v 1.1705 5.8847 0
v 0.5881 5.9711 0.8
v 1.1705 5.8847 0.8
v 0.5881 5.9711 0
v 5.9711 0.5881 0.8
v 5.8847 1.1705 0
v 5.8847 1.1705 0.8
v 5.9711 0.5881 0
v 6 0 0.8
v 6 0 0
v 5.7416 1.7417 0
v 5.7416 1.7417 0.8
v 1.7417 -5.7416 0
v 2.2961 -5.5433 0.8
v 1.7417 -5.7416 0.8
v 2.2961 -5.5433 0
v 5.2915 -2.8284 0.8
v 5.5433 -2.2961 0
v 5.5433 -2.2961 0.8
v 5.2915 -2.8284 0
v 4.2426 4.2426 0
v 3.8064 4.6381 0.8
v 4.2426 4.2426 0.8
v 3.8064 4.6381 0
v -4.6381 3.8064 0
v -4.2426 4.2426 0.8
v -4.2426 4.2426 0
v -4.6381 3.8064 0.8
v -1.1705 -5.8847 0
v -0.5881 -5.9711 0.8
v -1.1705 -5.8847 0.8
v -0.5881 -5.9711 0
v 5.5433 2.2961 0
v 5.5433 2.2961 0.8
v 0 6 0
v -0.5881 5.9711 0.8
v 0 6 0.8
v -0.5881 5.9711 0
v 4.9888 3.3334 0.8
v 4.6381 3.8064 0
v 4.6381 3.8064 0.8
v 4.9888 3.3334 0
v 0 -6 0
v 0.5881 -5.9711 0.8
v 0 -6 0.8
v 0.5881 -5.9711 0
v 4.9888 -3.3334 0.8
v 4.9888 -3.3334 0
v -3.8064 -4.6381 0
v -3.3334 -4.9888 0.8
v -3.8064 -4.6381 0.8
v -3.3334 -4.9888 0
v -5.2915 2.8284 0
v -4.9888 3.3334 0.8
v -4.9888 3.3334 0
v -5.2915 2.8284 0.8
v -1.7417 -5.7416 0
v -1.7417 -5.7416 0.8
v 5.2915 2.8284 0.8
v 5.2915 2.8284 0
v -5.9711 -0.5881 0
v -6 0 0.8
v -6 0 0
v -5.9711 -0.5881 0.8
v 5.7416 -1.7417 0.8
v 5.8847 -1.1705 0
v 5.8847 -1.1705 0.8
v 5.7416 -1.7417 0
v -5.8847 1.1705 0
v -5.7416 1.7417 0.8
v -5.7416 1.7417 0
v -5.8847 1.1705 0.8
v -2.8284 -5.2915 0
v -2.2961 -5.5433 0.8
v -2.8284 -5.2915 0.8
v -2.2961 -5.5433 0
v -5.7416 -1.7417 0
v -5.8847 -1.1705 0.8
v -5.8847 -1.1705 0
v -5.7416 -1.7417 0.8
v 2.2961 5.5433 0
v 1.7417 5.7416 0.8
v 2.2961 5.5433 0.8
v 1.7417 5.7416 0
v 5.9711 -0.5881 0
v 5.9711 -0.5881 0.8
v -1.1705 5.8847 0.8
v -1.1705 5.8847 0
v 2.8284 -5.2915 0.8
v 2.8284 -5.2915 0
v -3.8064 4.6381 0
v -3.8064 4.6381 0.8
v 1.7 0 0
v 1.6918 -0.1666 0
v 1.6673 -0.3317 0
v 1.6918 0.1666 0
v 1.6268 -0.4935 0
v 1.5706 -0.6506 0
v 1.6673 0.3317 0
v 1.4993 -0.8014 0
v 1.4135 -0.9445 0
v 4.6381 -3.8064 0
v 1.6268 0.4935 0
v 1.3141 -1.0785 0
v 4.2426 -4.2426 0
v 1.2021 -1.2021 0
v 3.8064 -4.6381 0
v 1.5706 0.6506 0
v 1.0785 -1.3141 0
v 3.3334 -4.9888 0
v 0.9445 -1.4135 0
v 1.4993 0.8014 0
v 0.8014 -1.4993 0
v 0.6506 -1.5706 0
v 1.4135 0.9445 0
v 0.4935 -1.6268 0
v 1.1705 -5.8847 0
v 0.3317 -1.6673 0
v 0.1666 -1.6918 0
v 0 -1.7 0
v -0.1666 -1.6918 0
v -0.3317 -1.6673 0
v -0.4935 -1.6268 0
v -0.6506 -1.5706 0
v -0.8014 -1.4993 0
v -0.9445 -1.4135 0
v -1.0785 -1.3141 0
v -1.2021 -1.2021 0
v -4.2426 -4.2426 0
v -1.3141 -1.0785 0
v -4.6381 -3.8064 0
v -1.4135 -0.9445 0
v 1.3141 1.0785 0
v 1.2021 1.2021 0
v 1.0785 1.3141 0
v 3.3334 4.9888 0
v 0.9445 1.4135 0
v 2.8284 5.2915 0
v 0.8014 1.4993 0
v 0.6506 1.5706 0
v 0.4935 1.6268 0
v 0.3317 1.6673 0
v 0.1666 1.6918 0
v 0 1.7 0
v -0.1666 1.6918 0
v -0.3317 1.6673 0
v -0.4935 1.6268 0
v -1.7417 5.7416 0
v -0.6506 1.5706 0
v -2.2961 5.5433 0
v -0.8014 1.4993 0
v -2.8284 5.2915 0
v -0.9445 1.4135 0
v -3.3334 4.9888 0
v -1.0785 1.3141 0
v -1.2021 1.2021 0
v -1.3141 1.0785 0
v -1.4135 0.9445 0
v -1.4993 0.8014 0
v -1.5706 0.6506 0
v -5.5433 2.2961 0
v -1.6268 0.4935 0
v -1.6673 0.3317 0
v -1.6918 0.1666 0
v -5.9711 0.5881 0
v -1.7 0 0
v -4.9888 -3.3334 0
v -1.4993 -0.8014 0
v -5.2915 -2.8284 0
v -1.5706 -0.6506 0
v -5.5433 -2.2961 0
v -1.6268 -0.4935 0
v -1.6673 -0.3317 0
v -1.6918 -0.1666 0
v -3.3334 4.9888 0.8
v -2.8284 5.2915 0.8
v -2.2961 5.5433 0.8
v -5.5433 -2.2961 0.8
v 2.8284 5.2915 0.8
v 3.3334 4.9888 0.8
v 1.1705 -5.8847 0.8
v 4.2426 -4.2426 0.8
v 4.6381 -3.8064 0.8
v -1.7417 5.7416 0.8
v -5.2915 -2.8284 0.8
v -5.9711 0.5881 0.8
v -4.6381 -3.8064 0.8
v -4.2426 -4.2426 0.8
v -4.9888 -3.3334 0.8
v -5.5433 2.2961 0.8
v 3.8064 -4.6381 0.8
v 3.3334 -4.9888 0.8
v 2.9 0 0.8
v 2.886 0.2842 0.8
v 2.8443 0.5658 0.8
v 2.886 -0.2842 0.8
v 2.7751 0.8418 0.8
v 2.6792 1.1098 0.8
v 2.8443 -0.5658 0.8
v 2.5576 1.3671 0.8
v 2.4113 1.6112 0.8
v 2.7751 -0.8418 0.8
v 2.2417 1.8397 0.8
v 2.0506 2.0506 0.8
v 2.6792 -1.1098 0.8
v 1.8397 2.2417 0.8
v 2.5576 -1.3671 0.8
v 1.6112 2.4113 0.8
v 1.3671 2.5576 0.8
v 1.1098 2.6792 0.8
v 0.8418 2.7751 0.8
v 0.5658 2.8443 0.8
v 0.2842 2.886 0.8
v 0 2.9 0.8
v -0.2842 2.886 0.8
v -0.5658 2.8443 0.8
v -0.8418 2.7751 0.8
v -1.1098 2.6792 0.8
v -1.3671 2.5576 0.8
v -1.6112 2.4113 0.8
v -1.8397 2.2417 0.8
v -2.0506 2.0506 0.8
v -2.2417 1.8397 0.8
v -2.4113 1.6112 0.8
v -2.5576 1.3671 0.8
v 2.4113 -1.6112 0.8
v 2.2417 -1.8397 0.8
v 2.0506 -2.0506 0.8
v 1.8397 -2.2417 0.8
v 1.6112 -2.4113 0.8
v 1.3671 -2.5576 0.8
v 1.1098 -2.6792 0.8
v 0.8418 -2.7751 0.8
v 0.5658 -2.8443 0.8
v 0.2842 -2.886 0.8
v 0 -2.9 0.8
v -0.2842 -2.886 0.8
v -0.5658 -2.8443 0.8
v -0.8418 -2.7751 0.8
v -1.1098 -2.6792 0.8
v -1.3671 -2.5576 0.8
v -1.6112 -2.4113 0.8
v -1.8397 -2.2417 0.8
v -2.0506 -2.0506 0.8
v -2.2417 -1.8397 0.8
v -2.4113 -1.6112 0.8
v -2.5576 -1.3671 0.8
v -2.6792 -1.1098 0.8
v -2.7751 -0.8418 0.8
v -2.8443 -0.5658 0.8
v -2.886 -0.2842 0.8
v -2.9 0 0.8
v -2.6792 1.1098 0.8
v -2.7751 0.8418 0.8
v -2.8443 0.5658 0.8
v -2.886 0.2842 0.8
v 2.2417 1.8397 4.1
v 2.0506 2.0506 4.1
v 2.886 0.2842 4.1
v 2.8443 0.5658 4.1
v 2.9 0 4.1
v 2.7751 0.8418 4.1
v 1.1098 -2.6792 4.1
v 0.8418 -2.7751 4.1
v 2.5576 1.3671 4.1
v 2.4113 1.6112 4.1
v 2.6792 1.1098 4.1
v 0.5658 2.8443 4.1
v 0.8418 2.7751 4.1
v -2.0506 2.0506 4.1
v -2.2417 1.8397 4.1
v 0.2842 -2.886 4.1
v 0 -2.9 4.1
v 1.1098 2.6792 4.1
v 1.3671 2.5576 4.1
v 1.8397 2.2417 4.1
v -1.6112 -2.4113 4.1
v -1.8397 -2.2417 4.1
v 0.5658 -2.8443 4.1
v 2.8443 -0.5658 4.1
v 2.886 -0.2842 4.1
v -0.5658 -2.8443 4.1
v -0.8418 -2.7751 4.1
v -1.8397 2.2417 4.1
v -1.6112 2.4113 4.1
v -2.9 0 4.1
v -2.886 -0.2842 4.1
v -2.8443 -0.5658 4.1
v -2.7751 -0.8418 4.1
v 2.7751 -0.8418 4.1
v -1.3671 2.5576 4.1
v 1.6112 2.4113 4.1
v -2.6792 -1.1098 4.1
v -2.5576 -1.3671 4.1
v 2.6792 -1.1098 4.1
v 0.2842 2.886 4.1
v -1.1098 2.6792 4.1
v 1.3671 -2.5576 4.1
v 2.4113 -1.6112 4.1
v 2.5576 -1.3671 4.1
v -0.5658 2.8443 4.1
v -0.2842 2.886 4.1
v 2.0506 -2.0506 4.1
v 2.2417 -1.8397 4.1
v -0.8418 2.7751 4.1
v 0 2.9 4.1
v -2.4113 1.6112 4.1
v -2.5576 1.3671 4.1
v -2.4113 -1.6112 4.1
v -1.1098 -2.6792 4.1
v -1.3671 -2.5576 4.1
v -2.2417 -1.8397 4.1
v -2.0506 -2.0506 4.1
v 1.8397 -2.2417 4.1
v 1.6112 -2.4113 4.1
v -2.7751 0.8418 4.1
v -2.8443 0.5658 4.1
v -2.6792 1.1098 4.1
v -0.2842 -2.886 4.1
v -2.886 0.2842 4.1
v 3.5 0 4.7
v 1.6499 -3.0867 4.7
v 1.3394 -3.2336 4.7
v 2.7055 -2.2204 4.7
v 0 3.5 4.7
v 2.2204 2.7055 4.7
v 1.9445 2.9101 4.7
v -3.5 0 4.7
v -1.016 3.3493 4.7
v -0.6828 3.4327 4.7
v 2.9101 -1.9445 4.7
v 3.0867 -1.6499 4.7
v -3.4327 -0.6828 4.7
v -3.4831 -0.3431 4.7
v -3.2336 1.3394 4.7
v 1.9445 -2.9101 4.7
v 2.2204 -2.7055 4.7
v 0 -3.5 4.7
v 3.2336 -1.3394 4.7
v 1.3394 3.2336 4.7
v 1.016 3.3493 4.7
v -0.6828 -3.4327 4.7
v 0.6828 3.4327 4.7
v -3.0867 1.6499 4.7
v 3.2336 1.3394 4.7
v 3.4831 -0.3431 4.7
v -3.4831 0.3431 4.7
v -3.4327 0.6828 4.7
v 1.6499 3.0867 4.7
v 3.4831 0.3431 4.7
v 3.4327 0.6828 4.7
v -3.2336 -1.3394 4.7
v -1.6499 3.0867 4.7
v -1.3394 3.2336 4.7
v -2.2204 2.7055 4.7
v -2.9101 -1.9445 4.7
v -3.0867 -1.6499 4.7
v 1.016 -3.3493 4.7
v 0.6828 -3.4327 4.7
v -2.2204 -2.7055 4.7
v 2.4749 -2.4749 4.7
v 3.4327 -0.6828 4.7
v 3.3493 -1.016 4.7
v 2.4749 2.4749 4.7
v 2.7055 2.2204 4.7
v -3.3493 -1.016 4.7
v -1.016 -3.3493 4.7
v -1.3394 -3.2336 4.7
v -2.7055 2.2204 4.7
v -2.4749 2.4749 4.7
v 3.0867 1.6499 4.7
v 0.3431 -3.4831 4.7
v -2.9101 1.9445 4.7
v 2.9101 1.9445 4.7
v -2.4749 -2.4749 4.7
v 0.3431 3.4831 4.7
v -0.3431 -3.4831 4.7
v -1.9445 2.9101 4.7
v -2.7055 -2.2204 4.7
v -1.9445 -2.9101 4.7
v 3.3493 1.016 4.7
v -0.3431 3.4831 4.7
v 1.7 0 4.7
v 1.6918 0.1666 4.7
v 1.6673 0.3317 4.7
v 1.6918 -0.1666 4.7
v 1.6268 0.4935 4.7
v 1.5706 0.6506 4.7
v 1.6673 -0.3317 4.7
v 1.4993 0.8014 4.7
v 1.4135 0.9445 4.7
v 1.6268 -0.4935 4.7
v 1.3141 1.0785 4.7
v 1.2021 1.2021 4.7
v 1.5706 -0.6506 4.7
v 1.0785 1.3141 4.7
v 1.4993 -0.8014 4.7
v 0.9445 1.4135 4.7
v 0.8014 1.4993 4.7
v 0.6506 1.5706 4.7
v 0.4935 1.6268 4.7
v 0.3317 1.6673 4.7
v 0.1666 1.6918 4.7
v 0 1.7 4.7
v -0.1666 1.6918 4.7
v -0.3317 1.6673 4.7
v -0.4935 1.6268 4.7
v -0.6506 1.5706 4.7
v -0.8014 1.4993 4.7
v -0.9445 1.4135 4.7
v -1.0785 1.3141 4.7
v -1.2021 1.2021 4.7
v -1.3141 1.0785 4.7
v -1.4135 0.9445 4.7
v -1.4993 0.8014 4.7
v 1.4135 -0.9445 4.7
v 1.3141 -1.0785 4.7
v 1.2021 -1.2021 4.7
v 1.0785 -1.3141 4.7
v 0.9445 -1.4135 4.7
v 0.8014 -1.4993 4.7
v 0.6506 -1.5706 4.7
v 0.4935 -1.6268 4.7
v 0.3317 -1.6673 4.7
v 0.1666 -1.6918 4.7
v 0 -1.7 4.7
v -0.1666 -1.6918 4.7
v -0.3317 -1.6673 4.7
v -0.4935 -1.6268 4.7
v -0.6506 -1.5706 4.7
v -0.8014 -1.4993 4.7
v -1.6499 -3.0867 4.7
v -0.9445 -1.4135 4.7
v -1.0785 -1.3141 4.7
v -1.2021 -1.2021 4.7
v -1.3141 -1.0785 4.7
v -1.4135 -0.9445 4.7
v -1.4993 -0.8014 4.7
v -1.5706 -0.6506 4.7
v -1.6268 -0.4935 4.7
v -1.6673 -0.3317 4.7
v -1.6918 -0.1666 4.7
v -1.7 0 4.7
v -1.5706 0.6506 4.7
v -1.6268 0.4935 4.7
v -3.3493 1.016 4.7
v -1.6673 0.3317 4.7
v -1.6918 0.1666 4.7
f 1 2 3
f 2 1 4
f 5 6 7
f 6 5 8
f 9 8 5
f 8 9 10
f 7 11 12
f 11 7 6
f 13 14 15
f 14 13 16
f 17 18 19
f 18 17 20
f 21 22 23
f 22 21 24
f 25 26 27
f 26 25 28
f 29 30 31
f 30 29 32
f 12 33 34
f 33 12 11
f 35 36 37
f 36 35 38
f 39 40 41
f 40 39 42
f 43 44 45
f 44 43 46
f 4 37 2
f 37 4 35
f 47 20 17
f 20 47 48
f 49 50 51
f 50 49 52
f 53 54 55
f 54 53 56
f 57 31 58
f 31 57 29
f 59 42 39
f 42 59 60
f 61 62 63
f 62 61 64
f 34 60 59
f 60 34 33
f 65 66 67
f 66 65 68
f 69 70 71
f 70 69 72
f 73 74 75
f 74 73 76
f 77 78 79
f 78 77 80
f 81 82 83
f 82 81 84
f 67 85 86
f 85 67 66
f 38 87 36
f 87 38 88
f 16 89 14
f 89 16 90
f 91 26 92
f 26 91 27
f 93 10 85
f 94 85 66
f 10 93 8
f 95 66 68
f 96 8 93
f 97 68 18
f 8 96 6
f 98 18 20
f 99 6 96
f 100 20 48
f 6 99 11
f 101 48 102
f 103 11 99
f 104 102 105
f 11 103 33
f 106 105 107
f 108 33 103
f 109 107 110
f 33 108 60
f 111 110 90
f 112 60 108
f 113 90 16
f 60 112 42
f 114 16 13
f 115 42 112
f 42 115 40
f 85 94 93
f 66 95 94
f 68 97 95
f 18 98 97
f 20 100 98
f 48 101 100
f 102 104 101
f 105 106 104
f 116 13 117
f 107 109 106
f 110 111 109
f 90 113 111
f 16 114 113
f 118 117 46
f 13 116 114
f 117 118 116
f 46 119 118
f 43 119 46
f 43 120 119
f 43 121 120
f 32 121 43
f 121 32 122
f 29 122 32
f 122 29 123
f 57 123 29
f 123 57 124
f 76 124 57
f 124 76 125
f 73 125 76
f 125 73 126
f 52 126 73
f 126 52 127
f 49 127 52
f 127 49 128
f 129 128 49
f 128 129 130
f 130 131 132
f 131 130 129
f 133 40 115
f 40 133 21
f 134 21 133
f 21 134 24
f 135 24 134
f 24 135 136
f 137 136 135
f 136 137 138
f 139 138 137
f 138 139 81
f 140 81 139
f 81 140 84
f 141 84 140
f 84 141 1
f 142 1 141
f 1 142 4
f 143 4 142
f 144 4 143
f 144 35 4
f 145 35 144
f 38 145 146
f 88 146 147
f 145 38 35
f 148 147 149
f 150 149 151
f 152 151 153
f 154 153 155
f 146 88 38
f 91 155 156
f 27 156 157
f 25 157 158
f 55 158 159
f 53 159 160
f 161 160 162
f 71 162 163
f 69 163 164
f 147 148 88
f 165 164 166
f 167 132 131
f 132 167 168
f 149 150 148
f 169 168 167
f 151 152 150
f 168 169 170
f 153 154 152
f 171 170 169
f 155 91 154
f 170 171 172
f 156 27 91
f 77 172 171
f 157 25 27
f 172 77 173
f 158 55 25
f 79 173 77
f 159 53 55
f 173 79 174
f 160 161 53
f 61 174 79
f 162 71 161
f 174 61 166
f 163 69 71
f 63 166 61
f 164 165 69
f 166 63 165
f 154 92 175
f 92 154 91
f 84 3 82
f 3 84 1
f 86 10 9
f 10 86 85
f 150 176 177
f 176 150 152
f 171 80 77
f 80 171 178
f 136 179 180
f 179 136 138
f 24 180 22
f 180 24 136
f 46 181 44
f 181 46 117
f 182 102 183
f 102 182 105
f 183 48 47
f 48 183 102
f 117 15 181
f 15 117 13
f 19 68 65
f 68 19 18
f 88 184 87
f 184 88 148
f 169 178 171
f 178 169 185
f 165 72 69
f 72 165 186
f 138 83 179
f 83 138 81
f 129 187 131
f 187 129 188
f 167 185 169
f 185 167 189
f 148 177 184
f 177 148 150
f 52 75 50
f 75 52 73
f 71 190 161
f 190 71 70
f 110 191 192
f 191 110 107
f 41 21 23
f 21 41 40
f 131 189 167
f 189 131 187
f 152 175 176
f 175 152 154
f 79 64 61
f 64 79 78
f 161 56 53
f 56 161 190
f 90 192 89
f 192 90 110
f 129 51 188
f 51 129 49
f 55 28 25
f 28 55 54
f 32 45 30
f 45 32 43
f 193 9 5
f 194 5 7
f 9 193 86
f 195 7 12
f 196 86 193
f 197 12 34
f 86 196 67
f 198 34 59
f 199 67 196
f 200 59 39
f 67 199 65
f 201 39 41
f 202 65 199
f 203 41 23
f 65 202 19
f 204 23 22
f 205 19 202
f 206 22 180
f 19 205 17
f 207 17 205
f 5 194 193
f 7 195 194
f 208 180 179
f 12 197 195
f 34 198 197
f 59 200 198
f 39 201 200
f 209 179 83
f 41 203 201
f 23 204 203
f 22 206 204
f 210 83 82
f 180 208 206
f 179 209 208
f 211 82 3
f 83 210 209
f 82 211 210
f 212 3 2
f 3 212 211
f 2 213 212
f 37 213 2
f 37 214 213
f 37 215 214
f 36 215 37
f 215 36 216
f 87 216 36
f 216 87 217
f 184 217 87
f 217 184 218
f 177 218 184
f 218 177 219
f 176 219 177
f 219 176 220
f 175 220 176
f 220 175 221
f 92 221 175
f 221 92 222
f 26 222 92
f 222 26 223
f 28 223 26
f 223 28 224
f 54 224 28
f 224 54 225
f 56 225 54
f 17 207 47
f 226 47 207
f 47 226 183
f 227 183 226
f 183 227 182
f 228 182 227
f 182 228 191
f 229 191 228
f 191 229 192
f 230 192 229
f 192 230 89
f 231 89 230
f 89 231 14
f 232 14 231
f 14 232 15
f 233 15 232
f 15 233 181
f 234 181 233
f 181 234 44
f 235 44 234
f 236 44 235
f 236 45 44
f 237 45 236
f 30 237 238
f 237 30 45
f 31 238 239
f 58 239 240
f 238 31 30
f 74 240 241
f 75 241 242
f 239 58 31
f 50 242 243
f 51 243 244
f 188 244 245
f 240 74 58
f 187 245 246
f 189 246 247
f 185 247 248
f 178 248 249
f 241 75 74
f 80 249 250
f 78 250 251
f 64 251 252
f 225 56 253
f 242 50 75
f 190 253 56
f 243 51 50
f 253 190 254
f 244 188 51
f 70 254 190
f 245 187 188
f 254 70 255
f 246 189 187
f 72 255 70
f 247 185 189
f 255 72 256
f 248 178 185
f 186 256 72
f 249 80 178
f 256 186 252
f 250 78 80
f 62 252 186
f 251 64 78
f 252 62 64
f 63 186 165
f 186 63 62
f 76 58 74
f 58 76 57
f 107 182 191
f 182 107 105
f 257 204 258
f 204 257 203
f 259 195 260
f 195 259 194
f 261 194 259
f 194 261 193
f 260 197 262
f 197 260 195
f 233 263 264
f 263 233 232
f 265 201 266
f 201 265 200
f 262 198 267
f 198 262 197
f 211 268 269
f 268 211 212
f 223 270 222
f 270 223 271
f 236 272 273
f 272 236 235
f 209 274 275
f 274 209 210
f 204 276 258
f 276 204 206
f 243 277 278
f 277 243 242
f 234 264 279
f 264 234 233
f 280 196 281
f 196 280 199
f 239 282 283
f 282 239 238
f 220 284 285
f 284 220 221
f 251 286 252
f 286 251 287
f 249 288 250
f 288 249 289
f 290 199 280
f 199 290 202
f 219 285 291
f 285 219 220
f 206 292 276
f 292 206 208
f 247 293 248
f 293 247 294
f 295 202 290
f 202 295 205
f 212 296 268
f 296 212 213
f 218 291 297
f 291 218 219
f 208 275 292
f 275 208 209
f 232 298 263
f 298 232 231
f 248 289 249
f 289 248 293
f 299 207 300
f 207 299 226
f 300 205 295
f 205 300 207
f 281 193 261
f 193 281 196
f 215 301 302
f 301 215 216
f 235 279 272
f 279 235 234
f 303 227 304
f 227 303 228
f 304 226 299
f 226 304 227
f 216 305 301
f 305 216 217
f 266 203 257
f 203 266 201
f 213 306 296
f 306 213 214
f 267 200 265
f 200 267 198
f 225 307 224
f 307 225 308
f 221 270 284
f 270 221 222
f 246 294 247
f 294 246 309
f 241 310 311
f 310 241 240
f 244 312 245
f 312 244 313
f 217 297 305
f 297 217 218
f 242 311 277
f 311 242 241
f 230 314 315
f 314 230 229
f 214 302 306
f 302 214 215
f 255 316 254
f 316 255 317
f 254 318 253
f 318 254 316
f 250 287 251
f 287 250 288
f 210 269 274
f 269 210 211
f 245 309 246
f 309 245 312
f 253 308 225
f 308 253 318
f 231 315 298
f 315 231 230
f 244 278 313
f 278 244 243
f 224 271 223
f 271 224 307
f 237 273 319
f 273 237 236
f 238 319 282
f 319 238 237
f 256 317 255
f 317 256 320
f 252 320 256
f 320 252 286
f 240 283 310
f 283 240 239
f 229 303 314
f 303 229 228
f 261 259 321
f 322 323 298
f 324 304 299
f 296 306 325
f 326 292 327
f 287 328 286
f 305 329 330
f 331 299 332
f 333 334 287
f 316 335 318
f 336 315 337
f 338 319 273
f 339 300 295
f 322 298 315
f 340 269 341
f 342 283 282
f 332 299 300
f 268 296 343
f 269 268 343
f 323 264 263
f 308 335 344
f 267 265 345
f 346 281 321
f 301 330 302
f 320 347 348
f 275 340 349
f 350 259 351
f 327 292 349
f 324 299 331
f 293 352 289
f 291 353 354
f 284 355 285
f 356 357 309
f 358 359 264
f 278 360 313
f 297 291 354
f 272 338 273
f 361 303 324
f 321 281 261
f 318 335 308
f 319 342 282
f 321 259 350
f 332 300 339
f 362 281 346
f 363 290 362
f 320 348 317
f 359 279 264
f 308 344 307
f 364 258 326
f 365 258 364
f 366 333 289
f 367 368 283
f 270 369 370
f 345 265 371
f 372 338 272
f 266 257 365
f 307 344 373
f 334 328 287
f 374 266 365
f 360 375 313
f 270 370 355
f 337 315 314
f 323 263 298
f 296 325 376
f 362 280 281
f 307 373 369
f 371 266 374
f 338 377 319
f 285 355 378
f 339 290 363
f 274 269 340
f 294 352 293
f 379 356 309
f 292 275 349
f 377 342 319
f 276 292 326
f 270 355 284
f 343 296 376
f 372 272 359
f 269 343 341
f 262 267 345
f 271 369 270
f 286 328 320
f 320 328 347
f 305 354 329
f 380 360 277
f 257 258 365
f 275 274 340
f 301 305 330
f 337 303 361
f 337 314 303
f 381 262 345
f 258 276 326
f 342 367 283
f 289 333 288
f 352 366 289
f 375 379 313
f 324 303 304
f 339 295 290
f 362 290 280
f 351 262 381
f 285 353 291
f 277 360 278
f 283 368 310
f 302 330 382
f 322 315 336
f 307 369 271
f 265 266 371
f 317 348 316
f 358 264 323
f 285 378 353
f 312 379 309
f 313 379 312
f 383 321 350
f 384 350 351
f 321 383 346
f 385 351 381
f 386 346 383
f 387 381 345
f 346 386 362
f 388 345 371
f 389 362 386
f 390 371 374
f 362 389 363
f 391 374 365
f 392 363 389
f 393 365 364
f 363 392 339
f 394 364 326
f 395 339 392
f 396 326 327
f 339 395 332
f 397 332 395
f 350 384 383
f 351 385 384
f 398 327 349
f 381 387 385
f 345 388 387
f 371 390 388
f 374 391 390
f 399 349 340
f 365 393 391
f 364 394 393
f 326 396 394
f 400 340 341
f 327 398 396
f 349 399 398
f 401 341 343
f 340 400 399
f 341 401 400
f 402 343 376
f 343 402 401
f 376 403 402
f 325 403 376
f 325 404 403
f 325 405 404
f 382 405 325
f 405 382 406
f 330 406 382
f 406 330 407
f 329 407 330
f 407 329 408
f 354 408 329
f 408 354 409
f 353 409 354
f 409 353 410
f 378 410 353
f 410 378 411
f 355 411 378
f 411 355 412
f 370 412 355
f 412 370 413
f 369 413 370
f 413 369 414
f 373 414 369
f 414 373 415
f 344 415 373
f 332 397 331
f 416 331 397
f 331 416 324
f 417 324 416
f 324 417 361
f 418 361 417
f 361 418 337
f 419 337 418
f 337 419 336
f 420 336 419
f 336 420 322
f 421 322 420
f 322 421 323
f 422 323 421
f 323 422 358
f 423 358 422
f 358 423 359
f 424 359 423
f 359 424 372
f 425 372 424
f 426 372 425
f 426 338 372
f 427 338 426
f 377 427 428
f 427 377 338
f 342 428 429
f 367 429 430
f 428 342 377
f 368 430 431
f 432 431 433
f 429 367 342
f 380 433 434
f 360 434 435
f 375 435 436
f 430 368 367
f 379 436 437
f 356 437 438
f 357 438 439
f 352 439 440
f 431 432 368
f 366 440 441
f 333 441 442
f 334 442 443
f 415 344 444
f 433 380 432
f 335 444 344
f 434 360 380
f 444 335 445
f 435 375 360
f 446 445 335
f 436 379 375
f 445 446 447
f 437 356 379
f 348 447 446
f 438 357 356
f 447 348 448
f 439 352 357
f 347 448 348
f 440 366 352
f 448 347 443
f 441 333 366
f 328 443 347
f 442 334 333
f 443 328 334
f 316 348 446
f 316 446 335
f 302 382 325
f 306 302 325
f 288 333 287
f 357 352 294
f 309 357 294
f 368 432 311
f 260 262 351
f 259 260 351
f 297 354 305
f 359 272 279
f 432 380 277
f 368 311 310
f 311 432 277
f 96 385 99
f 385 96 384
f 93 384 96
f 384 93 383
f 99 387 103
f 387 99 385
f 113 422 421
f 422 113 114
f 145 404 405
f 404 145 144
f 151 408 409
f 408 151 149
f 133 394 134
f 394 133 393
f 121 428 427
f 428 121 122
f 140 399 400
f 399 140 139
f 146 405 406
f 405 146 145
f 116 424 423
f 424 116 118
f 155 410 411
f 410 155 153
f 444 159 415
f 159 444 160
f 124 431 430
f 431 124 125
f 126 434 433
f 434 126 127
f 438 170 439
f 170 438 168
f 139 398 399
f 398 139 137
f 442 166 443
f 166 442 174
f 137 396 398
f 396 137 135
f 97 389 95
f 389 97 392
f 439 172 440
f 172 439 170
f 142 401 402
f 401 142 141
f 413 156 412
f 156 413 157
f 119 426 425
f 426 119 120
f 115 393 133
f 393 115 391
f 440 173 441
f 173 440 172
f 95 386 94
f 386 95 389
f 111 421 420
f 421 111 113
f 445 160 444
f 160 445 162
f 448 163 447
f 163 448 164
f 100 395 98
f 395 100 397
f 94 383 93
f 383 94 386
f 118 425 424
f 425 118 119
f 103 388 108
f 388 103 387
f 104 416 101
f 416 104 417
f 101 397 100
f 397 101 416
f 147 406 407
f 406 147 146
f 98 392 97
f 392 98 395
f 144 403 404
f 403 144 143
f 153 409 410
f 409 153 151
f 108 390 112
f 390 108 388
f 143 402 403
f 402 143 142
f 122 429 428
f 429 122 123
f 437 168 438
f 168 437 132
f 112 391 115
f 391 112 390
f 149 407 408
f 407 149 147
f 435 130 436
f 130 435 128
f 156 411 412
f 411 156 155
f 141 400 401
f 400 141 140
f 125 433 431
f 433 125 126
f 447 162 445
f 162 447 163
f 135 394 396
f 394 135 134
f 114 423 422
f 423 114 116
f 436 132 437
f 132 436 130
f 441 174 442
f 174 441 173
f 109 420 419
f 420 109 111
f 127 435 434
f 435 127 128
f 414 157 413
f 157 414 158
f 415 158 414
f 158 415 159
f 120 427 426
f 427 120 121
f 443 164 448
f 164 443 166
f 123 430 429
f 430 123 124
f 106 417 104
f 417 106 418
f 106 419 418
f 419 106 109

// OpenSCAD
// Computer case cover TPU protector

$fn = 64;

inside_d = 12.0;
inside_h = 0.8;
hole_d = 5.8;
hole_h = 3.3;
outer_d = 7.0;
outer_h = 0.6;
inner_hole_d = 3.4;

difference() {
    union() {
        cylinder(d=inside_d, h=inside_h);
        translate([0,0,inside_h])
        cylinder(d=hole_d, h=hole_h);
        translate([0,0,inside_h+hole_h])
        cylinder(d1=hole_d, d2=outer_d, h=outer_h);
    }
    cylinder(d=inner_hole_d, h=inside_h+hole_h+outer_h);
}
